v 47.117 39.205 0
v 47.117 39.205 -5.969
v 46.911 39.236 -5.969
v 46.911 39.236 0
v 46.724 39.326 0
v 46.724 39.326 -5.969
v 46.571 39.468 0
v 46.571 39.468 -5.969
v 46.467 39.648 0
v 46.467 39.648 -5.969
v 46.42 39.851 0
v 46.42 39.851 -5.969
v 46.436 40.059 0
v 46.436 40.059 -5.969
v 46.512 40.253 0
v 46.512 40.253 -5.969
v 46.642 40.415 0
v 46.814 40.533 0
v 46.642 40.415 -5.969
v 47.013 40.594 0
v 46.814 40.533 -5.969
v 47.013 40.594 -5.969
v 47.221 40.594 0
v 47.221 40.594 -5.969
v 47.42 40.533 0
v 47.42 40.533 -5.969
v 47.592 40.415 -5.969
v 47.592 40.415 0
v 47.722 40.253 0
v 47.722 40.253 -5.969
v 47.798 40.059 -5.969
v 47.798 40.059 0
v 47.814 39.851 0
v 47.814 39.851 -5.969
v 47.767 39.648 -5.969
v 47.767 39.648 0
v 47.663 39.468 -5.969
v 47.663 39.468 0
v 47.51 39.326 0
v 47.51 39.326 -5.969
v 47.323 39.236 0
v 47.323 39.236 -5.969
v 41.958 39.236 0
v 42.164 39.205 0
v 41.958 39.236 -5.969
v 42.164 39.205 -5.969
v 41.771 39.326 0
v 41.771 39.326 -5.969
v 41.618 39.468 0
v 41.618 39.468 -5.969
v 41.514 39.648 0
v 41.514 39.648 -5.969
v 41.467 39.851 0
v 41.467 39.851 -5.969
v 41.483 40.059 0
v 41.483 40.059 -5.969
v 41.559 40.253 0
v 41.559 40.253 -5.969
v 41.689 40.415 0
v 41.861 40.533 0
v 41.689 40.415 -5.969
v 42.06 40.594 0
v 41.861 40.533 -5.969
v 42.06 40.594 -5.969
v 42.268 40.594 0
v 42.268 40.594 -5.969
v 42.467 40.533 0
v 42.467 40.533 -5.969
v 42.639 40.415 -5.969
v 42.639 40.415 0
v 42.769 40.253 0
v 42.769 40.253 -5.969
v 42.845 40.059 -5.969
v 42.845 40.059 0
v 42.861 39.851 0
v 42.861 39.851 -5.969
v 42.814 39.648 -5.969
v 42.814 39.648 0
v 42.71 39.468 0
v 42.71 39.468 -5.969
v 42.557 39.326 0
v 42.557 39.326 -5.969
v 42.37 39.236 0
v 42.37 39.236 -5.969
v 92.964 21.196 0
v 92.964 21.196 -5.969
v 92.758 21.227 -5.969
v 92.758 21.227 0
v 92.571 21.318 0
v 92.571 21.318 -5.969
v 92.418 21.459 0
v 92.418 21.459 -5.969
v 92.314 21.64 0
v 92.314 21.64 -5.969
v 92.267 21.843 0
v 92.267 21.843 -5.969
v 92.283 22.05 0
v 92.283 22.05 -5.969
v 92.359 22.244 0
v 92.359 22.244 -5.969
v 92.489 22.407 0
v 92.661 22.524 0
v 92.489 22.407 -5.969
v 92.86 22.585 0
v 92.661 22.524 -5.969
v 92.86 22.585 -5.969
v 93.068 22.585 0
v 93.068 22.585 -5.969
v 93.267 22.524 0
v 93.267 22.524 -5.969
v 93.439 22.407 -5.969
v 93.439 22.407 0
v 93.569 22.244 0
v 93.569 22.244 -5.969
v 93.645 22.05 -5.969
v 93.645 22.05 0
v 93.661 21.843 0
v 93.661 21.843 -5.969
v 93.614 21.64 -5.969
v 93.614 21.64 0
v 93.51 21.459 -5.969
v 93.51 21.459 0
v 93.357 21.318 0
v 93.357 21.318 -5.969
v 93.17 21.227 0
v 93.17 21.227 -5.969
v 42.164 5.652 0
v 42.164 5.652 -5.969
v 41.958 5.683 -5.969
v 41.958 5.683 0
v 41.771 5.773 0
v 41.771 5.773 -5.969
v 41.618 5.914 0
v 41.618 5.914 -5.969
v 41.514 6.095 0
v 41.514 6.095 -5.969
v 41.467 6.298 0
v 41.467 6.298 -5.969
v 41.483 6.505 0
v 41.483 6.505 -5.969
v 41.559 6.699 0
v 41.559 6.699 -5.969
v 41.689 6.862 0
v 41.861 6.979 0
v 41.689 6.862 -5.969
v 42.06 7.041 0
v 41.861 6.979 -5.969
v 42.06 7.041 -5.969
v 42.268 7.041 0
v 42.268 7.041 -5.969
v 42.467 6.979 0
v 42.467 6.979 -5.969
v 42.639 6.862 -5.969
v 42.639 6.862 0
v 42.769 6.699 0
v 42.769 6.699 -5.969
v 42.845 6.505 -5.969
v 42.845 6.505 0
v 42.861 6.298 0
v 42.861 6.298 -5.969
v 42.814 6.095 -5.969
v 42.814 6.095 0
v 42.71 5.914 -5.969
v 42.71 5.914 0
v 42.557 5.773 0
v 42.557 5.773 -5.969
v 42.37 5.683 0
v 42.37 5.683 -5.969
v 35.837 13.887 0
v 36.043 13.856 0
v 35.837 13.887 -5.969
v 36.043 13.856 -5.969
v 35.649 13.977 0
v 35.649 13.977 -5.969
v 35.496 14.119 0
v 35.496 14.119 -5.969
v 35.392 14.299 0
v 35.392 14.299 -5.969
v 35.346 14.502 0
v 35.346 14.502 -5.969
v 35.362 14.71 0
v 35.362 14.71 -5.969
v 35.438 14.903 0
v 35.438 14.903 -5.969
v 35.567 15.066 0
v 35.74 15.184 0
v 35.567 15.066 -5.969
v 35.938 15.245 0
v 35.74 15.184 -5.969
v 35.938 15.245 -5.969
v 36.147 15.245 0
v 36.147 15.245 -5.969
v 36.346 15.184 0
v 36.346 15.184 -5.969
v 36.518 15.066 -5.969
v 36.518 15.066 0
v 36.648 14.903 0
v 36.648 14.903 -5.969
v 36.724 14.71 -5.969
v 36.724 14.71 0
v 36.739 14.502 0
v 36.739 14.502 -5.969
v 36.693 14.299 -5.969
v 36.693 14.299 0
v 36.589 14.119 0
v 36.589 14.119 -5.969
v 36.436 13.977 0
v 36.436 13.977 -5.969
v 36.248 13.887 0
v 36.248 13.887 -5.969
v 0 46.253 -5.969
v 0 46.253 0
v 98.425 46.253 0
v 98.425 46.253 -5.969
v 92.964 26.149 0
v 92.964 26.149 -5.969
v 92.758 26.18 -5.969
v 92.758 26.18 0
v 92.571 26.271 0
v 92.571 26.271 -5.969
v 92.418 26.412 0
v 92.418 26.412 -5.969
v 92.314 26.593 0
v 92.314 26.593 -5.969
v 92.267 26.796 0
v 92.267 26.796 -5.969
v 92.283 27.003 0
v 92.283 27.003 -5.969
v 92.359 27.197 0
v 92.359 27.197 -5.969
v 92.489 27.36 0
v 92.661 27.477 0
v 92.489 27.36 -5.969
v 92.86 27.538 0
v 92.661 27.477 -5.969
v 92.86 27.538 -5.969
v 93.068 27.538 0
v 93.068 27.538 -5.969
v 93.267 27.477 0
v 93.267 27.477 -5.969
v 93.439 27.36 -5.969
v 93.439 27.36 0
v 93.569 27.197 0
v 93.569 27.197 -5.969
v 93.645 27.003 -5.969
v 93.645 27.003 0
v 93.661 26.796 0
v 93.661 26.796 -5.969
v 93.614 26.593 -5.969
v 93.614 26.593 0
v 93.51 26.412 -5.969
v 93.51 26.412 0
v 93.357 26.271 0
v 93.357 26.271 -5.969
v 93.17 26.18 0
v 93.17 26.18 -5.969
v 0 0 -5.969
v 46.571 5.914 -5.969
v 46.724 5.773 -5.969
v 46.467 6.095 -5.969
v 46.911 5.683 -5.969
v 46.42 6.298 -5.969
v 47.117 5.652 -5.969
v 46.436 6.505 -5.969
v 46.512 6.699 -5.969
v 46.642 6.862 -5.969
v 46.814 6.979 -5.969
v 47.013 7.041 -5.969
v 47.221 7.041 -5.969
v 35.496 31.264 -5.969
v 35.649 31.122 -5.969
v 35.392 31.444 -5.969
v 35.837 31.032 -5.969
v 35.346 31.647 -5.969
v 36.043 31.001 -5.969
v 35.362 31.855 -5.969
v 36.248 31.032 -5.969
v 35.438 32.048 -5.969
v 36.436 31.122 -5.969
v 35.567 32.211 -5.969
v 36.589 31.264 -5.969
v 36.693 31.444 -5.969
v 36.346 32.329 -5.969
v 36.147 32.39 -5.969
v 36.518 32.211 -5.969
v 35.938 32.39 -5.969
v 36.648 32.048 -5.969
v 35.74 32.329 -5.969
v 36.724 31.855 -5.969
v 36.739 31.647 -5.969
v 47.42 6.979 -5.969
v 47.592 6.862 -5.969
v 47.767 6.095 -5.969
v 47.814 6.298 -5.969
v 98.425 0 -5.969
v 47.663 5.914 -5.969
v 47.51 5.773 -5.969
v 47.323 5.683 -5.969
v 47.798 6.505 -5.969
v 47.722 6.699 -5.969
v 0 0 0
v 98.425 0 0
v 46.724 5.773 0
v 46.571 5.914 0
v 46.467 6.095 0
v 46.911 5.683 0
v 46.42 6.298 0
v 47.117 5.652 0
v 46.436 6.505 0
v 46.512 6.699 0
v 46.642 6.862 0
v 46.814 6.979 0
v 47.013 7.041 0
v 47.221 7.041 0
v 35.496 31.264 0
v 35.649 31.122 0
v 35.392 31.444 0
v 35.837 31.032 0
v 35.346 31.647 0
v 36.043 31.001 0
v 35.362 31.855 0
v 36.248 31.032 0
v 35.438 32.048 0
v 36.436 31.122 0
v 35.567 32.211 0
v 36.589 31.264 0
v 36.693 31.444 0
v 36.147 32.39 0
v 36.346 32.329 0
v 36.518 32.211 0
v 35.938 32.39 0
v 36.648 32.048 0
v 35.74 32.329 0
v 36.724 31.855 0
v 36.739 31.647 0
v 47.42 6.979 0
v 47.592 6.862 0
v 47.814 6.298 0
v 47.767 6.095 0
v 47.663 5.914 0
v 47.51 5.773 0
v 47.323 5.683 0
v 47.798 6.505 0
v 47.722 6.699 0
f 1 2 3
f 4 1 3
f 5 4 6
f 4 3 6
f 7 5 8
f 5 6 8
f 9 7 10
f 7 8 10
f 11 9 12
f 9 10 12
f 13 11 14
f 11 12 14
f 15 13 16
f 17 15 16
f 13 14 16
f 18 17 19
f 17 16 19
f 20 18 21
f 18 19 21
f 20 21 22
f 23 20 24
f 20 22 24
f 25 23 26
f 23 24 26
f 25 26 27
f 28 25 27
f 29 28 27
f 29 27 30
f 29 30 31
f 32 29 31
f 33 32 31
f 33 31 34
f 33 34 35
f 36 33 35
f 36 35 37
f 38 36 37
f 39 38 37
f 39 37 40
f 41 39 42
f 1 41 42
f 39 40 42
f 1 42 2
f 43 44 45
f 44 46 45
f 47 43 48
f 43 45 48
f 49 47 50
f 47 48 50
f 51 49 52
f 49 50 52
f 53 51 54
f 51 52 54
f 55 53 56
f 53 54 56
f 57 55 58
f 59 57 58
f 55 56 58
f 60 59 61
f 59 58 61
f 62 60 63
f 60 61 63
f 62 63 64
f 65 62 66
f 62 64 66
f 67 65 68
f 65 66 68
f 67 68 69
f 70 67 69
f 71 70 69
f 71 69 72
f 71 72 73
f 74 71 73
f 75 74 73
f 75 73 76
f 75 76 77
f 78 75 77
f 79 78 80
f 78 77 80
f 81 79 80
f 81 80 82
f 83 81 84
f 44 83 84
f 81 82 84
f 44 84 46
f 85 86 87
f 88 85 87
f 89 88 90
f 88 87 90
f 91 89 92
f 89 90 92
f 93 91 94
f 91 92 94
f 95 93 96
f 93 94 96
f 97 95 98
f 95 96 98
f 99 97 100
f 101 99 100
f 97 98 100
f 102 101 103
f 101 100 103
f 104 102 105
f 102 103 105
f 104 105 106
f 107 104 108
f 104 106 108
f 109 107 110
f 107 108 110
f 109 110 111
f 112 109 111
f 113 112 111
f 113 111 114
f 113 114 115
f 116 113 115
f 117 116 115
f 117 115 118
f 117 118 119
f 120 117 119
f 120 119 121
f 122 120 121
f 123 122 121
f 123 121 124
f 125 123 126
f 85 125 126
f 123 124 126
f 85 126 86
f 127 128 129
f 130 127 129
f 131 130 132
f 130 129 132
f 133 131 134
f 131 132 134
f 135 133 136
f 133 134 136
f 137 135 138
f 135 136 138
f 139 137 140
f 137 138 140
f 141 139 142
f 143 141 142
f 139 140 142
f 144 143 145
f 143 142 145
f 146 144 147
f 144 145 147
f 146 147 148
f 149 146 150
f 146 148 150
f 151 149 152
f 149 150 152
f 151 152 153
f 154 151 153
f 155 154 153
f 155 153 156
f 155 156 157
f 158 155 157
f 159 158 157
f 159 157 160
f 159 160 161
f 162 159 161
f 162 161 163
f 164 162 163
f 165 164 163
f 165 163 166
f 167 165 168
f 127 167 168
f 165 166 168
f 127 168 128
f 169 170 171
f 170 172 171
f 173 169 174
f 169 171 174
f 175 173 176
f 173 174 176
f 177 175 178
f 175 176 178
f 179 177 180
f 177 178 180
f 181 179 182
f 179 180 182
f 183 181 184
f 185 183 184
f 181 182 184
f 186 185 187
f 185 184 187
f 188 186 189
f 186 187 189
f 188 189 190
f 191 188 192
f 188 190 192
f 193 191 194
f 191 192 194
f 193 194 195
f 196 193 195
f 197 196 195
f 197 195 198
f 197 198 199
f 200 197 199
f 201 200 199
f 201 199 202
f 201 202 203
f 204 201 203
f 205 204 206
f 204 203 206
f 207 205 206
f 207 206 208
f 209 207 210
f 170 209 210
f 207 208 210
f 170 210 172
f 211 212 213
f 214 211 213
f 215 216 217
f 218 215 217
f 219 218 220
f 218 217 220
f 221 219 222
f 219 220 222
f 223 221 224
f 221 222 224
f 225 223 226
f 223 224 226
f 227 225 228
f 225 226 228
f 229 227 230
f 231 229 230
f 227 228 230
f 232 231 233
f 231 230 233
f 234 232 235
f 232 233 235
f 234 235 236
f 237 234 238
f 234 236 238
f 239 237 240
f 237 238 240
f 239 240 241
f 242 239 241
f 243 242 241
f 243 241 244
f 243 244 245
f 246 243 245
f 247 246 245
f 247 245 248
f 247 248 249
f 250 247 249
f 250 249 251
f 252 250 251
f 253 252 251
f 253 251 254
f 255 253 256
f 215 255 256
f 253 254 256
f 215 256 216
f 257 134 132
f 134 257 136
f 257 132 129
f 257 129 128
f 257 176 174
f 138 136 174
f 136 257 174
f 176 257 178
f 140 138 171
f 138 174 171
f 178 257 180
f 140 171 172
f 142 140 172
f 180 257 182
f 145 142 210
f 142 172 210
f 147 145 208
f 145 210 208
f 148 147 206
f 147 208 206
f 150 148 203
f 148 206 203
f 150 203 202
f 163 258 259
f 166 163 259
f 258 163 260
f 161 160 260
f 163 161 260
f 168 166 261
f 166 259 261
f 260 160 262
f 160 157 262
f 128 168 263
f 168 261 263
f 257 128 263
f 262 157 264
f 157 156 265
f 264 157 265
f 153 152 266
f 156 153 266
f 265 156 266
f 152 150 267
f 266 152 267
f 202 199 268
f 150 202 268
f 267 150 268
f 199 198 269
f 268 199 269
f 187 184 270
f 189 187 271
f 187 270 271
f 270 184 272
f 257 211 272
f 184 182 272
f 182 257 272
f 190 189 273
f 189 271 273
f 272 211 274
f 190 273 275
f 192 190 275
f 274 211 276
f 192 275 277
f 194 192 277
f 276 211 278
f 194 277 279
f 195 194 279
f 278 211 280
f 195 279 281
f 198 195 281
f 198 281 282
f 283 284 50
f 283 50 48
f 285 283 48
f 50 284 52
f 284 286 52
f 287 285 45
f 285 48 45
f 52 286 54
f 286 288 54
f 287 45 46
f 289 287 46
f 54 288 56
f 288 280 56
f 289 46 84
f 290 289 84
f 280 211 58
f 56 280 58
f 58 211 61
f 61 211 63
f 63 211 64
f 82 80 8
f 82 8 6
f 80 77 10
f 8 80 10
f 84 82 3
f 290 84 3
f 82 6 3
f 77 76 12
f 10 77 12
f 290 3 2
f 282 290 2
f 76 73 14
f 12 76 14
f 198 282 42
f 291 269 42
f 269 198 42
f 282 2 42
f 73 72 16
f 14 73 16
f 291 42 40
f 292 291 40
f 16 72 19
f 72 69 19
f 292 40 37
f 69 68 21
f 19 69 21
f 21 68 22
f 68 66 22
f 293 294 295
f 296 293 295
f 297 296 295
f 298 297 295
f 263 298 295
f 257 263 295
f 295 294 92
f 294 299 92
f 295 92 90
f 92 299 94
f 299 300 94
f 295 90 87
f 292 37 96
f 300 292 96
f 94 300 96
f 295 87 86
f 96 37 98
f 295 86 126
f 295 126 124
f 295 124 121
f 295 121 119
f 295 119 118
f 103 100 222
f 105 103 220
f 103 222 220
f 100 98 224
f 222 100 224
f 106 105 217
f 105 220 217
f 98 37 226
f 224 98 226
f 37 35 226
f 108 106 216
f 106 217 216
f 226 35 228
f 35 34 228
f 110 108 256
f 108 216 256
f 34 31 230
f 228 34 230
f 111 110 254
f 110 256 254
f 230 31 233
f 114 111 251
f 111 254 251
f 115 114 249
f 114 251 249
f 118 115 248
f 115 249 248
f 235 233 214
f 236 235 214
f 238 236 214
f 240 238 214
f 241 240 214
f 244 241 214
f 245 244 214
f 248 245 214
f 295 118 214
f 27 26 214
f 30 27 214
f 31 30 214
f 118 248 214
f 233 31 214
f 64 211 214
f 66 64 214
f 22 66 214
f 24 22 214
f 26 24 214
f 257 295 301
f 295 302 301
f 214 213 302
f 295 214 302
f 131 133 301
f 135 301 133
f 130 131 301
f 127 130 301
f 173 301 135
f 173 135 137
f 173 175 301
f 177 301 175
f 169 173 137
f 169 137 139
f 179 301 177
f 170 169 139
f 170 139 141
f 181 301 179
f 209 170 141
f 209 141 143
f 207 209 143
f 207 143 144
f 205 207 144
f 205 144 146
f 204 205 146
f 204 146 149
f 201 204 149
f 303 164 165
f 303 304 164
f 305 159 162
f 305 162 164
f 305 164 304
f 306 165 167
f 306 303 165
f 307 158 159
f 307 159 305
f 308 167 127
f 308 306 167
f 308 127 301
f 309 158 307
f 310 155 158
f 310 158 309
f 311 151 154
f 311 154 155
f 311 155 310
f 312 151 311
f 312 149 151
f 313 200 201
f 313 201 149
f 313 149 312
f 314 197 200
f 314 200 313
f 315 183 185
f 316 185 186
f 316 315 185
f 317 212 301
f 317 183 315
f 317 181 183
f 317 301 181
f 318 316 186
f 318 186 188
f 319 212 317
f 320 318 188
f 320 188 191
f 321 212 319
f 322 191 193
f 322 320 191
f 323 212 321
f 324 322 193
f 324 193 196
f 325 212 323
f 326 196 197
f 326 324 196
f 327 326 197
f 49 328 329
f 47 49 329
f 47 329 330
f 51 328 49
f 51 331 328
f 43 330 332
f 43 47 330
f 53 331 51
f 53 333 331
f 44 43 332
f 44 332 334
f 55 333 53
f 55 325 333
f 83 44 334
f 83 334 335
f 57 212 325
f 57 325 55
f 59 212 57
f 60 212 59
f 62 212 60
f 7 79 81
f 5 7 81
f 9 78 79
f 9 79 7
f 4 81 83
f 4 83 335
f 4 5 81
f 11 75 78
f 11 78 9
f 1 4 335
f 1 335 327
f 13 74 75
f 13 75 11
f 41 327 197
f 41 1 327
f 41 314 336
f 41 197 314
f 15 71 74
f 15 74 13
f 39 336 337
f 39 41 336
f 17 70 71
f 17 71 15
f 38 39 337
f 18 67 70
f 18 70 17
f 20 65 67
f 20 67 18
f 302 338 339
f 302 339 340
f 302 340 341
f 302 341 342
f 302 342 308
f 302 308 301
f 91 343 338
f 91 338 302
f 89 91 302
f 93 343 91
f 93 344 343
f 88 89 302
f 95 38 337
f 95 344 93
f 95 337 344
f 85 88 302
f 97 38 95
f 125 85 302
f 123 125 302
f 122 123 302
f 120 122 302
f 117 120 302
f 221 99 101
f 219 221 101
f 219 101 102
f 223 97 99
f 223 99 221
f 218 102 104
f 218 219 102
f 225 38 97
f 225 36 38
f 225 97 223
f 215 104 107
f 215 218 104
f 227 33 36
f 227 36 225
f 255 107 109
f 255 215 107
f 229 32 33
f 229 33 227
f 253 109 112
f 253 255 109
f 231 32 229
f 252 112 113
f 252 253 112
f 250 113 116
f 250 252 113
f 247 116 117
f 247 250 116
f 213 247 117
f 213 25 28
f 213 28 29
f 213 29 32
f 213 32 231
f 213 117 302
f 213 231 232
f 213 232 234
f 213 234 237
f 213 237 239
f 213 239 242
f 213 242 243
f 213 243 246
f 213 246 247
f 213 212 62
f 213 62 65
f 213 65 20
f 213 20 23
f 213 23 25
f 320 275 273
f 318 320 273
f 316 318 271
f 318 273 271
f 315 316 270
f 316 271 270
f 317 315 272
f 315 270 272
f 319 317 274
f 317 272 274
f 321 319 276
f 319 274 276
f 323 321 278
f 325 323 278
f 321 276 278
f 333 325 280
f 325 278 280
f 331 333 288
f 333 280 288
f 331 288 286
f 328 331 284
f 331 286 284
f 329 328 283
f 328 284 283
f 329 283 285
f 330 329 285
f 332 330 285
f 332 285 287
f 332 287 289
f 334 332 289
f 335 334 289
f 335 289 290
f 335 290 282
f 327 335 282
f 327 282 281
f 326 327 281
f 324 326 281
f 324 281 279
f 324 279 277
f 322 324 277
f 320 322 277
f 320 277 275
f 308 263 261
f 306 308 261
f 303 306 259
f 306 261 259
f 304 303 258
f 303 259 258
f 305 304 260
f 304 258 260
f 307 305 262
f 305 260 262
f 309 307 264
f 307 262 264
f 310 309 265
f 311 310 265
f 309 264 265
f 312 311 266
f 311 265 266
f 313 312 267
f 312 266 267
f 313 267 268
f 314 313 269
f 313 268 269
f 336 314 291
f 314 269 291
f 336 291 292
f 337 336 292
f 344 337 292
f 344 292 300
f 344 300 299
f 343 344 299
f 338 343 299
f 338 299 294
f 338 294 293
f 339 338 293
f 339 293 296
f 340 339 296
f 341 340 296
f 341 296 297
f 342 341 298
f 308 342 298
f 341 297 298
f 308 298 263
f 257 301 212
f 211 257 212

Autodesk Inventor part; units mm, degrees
ref_plane "YZ Plane" through (0, 0, 0) normal (1, 0, 0) x (0, 1, 0)
sketch "Sketch1" plane through (0, 0, 0) normal (0, 0, 1) x (1, 0, 0)
  line L0 (0, 46.2534) -> (98.425, 46.2534)
  line L1 (98.425, 46.2534) -> (98.425, 0)
  line L2 (98.425, 0) -> (0, 0)
  line L3 (0, 0) -> (0, 46.2534)
  point P0 (0, 0)
  dimension "d0" = 98.425
  dimension "d1" = 46.2534
extrude "Extrusion1" add sketch "Sketch1" against normal blind 5.969
sketch "Sketch2" plane through (0, 0, 0) normal (0, 0, 1) x (1, 0, 0)
  line L0 (0, 0) -> (0, 46.2534) projected
  line L1 (98.425, 0) -> (0, 0) projected
  line L2 (98.425, 46.2534) -> (98.425, 0) projected
  line L3 (0, 46.2534) -> (98.425, 46.2534) projected
  point P0 (42.164, 39.9034)
  point P1 (47.117, 39.9034)
  point P2 (36.0426, 31.6992)
  point P3 (36.0426, 14.5542)
  point P4 (42.164, 6.35)
  point P5 (47.117, 6.35)
  point P6 (92.964, 26.8478)
  point P7 (92.964, 21.8948)
  dimension "d22" = 42.164
  dimension "d23" = 36.0426
  dimension "d24" = 14.5542
  dimension "d25" = 36.0426
  dimension "d26" = 47.117
  dimension "d27" = 42.164
  dimension "d29" = 5.461
  dimension "d32" = 19.4056
  dimension "d33" = 6.35
  dimension "d34" = 6.35
  dimension "d35" = 14.5542
  dimension "d36" = 6.35
  dimension "d37" = 6.35
  dimension "d38" = 4.953
  dimension "d39" = 17.145
  dimension "d40" = 5.461
  dimension "d41" = 4.953
hole "Hole1" at (42.164, 39.9034, 0) at (47.117, 39.9034, 0) at (36.0426, 31.6992, 0) at (36.0426, 14.5542, 0) at (42.164, 6.35, 0) at (47.117, 6.35, 0) at (92.964, 26.8478, 0) at (92.964, 21.8948, 0) direction (0, 0, -1) diameter 1.397 end through all
properties part number "Sun_BaseStaple" material "Wood (Birch)"
